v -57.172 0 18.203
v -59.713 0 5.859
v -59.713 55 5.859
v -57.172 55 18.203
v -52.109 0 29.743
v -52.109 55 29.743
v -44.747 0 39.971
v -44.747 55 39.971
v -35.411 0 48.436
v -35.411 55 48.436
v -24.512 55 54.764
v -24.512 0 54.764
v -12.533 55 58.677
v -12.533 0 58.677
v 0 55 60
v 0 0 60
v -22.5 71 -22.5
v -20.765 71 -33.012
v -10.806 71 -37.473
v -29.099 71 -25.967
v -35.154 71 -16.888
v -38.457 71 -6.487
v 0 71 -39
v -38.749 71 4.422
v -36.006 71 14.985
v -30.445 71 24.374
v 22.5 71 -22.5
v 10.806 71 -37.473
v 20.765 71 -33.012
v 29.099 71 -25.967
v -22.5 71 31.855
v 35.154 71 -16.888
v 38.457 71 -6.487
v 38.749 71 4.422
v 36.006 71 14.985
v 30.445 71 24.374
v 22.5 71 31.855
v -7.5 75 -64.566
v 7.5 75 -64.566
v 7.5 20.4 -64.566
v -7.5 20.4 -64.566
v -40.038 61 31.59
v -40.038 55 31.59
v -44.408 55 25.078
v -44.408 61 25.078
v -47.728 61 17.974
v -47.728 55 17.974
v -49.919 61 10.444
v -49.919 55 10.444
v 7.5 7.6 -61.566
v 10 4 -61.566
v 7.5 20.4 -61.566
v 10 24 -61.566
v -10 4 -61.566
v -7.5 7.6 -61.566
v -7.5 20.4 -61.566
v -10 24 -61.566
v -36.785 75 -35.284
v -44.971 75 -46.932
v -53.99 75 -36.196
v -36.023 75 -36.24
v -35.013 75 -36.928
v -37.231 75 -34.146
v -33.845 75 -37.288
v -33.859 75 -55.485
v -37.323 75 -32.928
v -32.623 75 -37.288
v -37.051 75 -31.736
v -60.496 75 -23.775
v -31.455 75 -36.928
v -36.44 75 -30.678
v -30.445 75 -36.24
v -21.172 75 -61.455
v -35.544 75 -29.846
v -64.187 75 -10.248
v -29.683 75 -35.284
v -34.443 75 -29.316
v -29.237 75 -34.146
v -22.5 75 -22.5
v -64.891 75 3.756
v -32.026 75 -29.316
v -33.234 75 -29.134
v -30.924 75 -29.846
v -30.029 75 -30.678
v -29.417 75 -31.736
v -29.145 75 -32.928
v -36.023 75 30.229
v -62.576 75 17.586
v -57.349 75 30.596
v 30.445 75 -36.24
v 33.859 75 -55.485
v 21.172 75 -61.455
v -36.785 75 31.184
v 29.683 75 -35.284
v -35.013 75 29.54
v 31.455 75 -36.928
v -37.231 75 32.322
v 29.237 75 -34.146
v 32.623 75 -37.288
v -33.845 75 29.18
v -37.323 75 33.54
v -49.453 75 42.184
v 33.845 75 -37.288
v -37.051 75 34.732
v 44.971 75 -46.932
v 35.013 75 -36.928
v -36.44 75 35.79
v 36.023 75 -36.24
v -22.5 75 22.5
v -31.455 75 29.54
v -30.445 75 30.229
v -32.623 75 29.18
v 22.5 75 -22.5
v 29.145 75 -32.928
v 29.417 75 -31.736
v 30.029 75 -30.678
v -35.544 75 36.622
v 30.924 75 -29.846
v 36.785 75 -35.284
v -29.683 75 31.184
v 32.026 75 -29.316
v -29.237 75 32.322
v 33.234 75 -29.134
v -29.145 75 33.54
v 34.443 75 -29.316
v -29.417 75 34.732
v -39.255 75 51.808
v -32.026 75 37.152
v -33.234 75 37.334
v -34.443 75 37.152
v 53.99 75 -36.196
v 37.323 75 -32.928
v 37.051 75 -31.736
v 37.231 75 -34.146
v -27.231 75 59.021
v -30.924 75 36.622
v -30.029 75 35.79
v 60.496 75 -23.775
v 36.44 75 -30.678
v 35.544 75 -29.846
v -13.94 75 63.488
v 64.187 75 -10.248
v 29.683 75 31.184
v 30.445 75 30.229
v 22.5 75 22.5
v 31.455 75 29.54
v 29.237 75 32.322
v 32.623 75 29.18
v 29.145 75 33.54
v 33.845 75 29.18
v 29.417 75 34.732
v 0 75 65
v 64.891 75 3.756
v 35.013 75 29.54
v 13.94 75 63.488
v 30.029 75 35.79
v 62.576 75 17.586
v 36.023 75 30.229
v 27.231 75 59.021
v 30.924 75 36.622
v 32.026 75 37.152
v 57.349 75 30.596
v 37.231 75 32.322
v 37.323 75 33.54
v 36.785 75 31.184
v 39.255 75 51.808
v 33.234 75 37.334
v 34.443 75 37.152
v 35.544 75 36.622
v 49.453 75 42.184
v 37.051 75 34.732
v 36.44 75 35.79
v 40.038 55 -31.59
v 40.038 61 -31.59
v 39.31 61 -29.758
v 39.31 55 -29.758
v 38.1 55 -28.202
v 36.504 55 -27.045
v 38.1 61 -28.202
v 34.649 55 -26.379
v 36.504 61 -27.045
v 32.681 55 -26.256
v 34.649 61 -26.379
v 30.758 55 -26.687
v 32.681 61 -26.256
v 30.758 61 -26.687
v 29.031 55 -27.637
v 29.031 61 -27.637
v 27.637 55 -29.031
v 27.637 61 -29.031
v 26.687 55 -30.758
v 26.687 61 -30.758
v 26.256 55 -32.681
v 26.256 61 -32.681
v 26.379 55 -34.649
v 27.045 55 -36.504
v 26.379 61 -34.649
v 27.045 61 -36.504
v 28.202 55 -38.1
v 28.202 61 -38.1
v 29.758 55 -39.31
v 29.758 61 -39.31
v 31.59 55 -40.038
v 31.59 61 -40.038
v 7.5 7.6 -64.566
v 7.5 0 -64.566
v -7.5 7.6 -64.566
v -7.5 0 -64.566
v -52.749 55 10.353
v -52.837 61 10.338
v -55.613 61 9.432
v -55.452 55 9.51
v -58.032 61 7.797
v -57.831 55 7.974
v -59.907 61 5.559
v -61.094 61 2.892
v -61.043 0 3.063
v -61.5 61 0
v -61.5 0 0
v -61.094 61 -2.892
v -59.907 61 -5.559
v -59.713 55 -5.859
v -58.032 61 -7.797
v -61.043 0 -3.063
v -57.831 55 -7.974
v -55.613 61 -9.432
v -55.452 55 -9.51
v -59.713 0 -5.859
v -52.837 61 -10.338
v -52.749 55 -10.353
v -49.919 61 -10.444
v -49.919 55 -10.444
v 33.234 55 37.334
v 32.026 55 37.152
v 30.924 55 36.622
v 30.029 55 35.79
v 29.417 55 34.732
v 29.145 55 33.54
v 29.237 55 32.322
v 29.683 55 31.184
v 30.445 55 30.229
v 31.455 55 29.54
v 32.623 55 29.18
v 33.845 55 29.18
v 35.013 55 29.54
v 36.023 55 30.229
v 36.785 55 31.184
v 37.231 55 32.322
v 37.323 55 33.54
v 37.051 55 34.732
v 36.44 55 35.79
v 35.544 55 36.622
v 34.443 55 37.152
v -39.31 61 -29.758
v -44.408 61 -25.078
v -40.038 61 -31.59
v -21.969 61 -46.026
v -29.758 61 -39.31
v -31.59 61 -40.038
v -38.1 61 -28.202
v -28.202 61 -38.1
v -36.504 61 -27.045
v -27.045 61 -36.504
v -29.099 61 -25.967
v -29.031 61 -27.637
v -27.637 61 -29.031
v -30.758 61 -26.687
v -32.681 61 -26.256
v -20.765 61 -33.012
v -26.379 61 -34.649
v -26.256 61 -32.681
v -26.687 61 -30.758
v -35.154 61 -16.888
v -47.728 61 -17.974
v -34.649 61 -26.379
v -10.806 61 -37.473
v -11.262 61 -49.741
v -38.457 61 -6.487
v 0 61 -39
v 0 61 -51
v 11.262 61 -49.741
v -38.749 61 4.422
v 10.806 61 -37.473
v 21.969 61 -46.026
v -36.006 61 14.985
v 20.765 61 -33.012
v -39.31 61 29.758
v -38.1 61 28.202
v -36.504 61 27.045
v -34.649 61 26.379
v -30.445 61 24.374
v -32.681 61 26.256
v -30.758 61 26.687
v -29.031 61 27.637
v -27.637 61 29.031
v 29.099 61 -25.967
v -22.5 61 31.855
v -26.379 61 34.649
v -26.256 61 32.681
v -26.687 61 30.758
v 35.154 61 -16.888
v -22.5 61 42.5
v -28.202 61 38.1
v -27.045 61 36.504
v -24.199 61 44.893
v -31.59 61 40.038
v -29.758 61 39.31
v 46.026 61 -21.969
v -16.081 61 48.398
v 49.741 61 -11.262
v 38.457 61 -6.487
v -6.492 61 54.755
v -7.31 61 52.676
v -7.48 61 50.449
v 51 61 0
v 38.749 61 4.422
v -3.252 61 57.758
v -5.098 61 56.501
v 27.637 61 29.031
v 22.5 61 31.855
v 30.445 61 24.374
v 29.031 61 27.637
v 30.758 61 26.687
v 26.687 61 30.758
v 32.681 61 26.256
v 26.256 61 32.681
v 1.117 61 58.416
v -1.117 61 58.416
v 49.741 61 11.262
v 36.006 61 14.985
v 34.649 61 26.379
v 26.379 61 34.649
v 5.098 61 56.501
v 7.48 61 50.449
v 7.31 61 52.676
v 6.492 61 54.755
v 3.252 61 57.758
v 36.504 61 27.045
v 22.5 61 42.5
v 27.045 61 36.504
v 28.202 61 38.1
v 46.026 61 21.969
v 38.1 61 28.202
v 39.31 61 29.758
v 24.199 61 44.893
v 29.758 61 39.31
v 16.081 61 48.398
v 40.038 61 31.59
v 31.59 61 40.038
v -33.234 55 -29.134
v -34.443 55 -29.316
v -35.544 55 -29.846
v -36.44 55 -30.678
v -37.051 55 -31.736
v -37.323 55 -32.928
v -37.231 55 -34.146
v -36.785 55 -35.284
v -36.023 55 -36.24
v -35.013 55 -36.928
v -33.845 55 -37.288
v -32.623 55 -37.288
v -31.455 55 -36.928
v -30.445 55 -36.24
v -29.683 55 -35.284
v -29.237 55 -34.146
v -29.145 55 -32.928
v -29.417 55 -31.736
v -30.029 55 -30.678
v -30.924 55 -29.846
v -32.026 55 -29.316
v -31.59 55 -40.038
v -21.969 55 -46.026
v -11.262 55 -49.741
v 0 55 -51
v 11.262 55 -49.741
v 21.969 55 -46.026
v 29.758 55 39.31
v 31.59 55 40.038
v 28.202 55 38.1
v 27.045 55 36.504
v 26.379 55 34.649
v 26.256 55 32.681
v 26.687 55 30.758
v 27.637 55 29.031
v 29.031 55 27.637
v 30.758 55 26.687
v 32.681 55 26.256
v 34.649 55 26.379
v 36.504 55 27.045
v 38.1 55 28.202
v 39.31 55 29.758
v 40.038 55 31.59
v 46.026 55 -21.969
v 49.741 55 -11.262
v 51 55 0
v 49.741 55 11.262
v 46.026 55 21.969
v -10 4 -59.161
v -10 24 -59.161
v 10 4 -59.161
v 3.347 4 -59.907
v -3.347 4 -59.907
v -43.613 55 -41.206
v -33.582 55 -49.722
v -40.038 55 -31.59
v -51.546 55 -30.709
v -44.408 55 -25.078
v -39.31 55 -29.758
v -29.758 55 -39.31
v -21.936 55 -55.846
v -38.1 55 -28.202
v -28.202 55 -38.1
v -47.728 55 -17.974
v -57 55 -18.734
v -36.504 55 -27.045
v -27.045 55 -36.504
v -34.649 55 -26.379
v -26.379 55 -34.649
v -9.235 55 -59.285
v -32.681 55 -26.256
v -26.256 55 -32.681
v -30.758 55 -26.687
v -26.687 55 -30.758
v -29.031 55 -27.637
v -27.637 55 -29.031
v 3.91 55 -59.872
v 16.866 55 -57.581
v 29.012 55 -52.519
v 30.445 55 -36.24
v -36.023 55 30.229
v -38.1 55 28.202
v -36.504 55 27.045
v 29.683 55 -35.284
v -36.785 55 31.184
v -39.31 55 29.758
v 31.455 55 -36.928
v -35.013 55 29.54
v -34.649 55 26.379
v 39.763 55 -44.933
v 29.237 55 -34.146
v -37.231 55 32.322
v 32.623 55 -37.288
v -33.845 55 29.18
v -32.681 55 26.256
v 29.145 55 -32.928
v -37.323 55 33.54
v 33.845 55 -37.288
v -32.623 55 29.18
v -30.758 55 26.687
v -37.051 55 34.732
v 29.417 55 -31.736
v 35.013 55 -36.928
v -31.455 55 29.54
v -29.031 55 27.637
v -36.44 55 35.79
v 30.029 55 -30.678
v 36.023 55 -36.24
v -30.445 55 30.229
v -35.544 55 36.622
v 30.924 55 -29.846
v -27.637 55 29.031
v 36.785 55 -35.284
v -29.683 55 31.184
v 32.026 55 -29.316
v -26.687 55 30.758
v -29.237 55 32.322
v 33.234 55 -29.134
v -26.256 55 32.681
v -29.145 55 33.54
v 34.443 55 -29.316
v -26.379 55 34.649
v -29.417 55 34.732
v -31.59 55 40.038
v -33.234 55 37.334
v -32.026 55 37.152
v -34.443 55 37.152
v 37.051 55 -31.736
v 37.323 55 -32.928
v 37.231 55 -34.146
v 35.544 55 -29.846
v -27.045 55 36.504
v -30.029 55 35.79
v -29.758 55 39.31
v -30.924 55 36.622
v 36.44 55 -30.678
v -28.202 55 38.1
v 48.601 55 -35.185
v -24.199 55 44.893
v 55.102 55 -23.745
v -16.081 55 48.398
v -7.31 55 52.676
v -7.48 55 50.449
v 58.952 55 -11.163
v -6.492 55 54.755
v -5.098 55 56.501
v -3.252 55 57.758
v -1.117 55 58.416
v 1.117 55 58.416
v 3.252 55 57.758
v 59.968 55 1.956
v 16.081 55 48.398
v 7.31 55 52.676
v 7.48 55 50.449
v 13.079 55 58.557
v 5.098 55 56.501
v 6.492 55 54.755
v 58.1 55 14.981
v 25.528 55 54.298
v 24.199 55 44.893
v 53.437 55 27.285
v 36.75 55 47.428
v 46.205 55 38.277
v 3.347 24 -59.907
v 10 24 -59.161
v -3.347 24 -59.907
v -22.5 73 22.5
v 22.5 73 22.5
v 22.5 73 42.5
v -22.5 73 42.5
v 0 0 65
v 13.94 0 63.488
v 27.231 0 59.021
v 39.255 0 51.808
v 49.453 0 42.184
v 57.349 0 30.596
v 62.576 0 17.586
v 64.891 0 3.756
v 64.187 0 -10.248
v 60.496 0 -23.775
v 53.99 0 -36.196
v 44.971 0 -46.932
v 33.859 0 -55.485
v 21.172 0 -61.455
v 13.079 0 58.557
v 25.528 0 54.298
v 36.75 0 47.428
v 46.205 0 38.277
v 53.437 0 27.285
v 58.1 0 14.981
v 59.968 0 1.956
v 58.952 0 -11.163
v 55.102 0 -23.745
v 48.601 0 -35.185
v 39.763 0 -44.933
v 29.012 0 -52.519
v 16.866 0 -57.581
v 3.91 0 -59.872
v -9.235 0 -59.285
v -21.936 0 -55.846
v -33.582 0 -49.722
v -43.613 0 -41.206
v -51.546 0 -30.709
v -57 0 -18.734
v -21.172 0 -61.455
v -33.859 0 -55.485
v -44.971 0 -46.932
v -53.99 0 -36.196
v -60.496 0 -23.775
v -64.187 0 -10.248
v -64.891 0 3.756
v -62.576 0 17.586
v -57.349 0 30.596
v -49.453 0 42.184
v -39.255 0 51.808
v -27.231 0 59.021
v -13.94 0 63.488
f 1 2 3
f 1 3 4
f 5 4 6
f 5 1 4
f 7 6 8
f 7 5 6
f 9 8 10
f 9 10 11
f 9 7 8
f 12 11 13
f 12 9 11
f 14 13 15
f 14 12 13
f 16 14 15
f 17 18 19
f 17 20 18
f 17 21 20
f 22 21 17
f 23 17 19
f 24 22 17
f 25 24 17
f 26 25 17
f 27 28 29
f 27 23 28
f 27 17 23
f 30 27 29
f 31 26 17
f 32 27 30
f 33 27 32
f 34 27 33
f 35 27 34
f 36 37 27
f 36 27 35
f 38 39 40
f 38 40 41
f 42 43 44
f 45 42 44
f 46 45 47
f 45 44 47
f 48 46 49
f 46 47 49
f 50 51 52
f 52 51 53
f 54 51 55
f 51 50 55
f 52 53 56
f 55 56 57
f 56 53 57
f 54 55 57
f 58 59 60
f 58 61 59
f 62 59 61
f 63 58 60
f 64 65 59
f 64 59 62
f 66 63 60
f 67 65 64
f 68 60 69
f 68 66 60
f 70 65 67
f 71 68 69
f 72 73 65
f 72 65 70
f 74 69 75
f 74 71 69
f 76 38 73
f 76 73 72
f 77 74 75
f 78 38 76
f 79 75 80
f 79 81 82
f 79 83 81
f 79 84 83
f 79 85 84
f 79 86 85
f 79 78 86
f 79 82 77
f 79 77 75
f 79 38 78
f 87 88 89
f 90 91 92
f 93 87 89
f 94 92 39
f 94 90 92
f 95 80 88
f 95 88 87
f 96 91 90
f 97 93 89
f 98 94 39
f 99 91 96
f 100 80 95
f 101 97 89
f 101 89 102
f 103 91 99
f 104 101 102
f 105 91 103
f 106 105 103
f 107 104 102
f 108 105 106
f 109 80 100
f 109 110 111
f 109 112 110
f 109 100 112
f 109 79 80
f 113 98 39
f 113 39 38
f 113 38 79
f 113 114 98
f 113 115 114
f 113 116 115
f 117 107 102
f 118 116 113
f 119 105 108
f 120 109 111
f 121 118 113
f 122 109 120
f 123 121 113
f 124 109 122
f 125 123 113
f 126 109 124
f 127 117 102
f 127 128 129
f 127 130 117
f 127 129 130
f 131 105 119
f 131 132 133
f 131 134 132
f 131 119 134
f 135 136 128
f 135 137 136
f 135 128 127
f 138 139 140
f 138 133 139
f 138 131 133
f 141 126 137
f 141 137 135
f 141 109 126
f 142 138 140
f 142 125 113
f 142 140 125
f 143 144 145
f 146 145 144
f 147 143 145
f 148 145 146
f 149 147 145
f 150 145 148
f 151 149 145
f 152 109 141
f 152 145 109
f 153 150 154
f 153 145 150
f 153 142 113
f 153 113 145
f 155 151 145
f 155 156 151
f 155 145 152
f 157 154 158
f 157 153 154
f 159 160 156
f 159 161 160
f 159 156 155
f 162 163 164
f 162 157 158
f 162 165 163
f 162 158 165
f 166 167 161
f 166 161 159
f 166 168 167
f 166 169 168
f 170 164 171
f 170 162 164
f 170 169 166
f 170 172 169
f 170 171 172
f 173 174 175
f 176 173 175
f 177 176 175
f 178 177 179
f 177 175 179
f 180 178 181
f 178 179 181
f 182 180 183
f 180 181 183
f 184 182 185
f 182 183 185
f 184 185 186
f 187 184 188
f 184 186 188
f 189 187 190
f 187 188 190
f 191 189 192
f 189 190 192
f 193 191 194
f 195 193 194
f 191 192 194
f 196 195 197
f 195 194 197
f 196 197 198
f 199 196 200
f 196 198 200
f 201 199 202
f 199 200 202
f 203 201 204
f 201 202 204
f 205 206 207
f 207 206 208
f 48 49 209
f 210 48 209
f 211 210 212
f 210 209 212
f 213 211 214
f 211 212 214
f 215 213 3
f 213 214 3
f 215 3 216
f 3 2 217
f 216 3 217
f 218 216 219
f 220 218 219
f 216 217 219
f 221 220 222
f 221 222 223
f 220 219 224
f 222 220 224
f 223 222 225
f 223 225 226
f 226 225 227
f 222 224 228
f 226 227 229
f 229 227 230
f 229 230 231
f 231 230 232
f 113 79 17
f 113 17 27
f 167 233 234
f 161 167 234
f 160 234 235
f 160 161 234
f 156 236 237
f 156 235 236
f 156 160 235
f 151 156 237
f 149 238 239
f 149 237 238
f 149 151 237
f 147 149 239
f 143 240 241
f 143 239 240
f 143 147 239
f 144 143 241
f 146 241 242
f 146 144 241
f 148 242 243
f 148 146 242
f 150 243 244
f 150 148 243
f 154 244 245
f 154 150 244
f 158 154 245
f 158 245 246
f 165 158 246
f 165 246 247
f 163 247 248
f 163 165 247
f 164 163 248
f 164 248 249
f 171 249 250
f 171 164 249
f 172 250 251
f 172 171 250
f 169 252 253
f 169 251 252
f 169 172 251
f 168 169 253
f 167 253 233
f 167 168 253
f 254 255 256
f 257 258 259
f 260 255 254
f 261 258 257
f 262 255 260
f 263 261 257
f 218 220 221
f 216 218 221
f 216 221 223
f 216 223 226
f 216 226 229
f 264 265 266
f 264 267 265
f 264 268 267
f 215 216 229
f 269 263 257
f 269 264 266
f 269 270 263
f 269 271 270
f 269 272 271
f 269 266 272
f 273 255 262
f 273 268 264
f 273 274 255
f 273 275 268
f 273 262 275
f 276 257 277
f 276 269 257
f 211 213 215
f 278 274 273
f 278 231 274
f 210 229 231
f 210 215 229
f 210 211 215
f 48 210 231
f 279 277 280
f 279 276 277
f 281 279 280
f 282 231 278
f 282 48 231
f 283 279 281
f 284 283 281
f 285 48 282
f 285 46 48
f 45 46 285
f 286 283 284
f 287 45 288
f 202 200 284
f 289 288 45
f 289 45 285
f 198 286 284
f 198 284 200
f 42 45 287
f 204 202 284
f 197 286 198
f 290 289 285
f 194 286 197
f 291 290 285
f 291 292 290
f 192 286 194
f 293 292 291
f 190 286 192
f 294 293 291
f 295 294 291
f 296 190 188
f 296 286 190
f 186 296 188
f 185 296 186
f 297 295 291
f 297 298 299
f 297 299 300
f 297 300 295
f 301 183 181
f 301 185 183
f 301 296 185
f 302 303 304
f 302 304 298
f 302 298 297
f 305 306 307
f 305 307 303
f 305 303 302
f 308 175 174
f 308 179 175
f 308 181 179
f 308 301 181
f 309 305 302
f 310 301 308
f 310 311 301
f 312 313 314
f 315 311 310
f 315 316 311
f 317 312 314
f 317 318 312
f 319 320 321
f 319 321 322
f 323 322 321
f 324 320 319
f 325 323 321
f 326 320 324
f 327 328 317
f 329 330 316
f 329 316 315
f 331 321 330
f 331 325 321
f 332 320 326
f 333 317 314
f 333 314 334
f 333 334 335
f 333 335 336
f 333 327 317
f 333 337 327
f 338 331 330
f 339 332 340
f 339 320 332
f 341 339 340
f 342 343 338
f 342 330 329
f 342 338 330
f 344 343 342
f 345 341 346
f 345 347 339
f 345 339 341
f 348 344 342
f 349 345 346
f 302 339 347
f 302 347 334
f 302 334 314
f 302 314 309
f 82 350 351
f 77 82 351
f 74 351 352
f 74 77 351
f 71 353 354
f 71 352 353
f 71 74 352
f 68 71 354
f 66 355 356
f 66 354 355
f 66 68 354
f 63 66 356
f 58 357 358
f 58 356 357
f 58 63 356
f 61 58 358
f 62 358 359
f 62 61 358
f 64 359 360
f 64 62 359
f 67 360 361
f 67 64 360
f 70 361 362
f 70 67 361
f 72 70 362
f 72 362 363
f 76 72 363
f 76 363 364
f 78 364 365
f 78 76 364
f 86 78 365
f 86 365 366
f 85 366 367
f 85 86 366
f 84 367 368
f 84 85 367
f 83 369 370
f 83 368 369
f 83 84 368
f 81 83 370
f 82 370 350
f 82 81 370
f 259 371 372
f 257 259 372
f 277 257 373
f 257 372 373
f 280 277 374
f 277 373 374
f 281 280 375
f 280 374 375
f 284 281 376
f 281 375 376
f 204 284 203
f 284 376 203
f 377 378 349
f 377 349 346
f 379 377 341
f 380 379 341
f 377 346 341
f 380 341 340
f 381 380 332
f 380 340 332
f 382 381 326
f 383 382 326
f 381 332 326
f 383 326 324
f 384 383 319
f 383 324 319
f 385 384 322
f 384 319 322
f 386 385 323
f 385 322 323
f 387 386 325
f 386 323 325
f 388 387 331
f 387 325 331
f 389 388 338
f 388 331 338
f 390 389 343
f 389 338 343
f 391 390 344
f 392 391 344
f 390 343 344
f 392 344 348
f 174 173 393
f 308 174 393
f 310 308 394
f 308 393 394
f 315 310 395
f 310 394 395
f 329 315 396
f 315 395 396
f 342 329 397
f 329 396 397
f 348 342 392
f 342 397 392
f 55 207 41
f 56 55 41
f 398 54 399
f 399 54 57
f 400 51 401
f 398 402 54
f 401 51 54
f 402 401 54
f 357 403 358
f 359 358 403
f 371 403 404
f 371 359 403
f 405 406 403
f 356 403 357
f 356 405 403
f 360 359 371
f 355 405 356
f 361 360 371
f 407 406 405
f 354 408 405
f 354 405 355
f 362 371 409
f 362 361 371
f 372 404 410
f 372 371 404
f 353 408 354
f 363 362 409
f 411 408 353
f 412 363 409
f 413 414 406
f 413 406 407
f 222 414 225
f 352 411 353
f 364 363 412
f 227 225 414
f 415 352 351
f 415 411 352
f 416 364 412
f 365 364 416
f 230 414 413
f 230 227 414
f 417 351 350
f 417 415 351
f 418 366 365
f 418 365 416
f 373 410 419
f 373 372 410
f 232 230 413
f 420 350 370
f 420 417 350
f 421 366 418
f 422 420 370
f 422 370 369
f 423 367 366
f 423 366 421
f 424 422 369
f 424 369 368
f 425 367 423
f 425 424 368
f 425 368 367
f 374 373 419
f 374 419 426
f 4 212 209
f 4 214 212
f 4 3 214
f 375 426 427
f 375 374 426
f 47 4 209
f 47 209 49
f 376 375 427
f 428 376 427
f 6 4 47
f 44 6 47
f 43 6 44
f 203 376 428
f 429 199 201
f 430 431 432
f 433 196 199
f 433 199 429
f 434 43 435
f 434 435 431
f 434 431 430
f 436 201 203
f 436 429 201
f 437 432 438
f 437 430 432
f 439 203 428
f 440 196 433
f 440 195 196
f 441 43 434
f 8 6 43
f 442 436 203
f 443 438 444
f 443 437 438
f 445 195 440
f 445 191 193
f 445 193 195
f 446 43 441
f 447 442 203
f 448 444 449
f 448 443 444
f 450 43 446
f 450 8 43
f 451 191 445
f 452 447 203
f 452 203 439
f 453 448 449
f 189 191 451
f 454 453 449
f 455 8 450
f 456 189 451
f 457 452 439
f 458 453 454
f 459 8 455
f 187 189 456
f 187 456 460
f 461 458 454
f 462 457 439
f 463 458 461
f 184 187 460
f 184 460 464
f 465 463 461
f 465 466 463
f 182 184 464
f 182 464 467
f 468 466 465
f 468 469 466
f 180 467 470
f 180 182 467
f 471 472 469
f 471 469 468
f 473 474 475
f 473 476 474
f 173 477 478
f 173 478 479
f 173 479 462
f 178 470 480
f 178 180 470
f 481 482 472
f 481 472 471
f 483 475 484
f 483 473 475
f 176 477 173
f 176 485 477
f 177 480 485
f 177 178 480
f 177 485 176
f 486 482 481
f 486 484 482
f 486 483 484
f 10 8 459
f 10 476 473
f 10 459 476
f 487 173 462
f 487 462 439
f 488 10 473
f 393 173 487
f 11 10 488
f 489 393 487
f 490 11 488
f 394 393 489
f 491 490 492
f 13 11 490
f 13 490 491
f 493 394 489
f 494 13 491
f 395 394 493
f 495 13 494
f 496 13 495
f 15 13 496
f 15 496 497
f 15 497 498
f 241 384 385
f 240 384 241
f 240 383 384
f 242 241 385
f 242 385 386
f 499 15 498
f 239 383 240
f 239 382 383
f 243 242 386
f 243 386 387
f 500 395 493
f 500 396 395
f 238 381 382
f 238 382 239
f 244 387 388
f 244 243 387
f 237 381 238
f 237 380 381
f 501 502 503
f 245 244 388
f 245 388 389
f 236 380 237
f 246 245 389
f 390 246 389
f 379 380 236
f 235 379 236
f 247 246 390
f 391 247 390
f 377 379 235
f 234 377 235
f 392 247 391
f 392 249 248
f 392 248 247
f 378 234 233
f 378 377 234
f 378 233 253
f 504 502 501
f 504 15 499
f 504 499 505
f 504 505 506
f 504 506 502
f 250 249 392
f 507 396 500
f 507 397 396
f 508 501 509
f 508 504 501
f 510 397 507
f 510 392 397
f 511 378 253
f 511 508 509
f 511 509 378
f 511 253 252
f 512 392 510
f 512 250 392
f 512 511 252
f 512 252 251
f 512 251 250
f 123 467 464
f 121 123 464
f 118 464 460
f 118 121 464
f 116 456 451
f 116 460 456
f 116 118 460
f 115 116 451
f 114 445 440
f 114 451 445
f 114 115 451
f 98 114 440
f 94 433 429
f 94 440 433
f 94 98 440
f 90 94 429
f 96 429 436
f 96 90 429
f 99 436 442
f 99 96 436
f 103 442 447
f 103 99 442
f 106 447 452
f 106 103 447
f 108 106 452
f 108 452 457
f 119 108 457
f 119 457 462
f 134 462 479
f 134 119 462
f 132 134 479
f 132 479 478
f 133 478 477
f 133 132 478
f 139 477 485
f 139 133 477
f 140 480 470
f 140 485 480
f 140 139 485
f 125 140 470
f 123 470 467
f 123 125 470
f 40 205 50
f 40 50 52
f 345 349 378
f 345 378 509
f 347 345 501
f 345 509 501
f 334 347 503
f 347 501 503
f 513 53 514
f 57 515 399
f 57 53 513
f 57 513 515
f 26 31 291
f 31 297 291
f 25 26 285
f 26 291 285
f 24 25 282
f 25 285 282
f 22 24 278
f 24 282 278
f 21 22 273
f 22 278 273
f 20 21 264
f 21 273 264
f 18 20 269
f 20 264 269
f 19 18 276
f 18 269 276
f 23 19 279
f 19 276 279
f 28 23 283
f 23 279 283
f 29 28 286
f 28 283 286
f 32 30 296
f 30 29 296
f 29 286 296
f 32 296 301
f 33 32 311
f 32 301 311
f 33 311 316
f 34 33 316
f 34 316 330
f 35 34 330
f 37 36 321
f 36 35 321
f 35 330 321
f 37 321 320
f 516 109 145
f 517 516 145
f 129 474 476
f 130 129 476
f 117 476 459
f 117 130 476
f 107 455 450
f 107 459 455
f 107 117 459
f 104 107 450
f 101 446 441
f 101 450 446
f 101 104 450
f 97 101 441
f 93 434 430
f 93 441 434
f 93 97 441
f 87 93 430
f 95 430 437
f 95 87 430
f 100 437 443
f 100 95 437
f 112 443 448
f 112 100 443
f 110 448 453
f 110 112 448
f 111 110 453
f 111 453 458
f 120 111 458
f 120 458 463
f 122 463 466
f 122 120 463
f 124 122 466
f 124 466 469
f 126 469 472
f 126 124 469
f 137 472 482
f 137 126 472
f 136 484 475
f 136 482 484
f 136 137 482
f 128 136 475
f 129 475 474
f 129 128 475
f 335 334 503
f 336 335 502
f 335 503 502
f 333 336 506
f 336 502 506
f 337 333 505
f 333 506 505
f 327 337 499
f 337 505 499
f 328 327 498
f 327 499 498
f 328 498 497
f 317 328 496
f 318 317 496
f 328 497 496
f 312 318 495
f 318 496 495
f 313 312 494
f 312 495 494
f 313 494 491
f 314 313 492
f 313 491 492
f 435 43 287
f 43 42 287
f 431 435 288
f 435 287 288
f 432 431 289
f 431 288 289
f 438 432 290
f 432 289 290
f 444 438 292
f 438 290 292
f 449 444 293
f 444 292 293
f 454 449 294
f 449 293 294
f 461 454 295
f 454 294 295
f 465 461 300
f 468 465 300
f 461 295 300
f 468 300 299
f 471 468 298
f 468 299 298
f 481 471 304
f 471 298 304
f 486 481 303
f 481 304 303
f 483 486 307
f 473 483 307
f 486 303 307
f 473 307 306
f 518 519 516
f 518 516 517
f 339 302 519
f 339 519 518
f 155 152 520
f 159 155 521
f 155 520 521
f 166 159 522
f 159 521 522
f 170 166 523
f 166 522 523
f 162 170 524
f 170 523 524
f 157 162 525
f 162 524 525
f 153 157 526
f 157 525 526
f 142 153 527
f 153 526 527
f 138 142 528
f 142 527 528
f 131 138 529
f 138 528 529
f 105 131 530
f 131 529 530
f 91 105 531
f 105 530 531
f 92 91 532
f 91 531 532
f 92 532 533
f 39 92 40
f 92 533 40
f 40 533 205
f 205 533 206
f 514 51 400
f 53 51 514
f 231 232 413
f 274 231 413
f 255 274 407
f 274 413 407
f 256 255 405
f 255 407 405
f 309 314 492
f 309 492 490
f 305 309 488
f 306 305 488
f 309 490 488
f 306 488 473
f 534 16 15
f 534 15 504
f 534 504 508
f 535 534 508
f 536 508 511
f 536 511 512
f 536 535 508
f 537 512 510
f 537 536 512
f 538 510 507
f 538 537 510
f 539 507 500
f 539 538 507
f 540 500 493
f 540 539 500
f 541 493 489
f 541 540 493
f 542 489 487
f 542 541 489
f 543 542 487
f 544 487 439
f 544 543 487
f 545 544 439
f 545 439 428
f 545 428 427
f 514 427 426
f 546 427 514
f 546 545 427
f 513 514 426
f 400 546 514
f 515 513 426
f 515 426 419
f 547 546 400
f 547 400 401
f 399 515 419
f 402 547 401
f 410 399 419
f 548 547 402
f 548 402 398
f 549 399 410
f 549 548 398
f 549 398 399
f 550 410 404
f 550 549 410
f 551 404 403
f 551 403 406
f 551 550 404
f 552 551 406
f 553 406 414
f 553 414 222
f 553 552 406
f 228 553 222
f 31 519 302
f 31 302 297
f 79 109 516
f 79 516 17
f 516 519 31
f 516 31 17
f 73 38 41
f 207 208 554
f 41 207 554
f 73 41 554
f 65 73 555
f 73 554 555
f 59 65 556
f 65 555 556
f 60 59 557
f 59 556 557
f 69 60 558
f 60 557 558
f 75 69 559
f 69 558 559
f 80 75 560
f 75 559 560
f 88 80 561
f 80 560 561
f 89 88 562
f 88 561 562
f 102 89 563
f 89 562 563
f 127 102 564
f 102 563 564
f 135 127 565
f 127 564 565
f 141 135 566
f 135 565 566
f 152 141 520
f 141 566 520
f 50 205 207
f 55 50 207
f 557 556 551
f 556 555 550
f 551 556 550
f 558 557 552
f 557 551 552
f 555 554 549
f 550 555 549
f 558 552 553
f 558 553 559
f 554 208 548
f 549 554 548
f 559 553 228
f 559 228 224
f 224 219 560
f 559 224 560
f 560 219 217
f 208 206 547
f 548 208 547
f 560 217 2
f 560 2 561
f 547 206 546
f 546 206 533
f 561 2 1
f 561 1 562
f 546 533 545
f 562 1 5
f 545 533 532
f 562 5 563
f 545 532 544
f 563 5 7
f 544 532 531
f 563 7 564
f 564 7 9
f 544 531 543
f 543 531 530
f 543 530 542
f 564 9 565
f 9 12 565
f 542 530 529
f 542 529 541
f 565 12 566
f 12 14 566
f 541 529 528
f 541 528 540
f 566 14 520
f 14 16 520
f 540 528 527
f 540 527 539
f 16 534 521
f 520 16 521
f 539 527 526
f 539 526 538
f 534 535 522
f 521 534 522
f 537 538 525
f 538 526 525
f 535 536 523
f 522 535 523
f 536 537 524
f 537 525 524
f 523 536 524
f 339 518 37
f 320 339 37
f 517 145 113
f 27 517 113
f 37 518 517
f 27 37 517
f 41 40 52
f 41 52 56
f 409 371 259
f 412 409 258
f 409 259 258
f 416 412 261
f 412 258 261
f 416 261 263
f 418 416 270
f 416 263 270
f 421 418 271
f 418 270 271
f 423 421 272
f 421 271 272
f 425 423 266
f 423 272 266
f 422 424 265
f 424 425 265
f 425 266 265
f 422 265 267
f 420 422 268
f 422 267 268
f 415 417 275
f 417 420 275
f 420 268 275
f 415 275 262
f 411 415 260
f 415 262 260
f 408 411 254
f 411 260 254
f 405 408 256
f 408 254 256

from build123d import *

# Parameters (mm, degrees)
SKETCH1_R               = 65
SKETCH1_R_2             = 60
BOSS_EXTRUDE1_DEPTH     = 55
SKETCH2_R               = 65
BOSS_EXTRUDE2_DEPTH     = 20
SKETCH3_R               = 4.1
SKETCH3_W               = 45
SKETCH3_H               = 45
CUT_EXTRUDE1_DEPTH      = 76
SKETCH5_W               = 45
SKETCH5_H               = 20
CUT_EXTRUDE2_DEPTH      = 18
SKETCH6_R               = 51
CUT_EXTRUDE3_DEPTH      = 6
SKETCH7_R               = 7
SKETCH7_R_2             = 4.1
BOSS_EXTRUDE3_DEPTH     = 6
SKETCH8_R               = 39
CUT_EXTRUDE4_DEPTH      = 10
CUT_EXTRUDE5_DEPTH      = 1
CUT_EXTRUDE5_DEPTH_BACK = 76
SKETCH10_W              = 15
SKETCH10_H              = 12.8
CUT_EXTRUDE6_DEPTH      = 10
CUT_EXTRUDE7_START      = -3
SKETCH11_W              = 20
SKETCH11_H              = 20
CUT_EXTRUDE7_DEPTH      = 10
SKETCH12_R              = 7.5
CUT_EXTRUDE8_DEPTH      = 6
SKETCH13_R              = 10.5
CUT_EXTRUDE9_DEPTH      = 56
CUT_EXTRUDE9_DEPTH_BACK = 6


with BuildPart() as part:
    # Sketch1 → Boss-Extrude1 (new body)
    with BuildSketch(Plane(origin=(0, 0, 0), x_dir=(1, 0, 0), z_dir=(0, 1, 0))):
        with Locations(Location((0, 0, 0), (0, 0, 270))):  # turned: the seam where the file's is
            Circle(SKETCH1_R)
        with Locations(Location((0, 0, 0), (0, 0, 270))):  # turned: the seam where the file's is
            Circle(SKETCH1_R_2, mode=Mode.SUBTRACT)
    extrude(amount=BOSS_EXTRUDE1_DEPTH)

    # Sketch2 → Boss-Extrude2 (add)
    with BuildSketch(Plane(origin=(0, 55, 0), x_dir=(1, 0, 0), z_dir=(0, 1, 0))):
        with Locations(Location((0, 0, 0), (0, 0, 270))):  # turned: the seam where the file's is
            Circle(SKETCH2_R)
    extrude(amount=BOSS_EXTRUDE2_DEPTH)

    # Sketch3 → Cut-Extrude1 (cut, through all)
    with BuildSketch(Plane(origin=(0, 75, 0), x_dir=(1, 0, 0), z_dir=(0, 1, 0))):
        with Locations(Location((-33.234018716, -33.234018716, 0), (0, 0, 270))):  # turned: the seam where the file's is
            Circle(SKETCH3_R)
        with Locations(Location((-33.234018716, 33.234018716, 0), (0, 0, 270))):  # turned: the seam where the file's is
            Circle(SKETCH3_R)
        with Locations(Location((33.234018716, 33.234018716, 0), (0, 0, 270))):  # turned: the seam where the file's is
            Circle(SKETCH3_R)
        with Locations(Location((33.234018716, -33.234018716, 0), (0, 0, 270))):  # turned: the seam where the file's is
            Circle(SKETCH3_R)
        Rectangle(SKETCH3_W, SKETCH3_H)
    extrude(amount=-CUT_EXTRUDE1_DEPTH, mode=Mode.SUBTRACT)

    # Sketch5 → Cut-Extrude2 (cut)
    with BuildSketch(Plane.XZ.offset(-55)):
        with Locations((0, 32.5)):
            Rectangle(SKETCH5_W, SKETCH5_H)
    extrude(amount=-CUT_EXTRUDE2_DEPTH, mode=Mode.SUBTRACT)

    # Sketch6 → Cut-Extrude3 (cut)
    with BuildSketch(Plane.XZ.offset(-55)):
        Circle(SKETCH6_R)
    extrude(amount=-CUT_EXTRUDE3_DEPTH, mode=Mode.SUBTRACT)

    # Sketch7 → Boss-Extrude3 (add)
    with BuildSketch(Plane.XZ.offset(-61)):
        with Locations((-33.234018716, -33.234018716)):
            Circle(SKETCH7_R)
        with Locations(Location((-33.234018716, -33.234018716, 0), (0, 0, 90))):  # turned: the seam where the file's is
            Circle(SKETCH7_R_2, mode=Mode.SUBTRACT)
        with Locations((-33.234018716, 33.234018716)):
            Circle(SKETCH7_R)
        with Locations(Location((-33.234018716, 33.234018716, 0), (0, 0, 90))):  # turned: the seam where the file's is
            Circle(SKETCH7_R_2, mode=Mode.SUBTRACT)
        with Locations((33.234018716, -33.234018716)):
            Circle(SKETCH7_R)
        with Locations(Location((33.234018716, -33.234018716, 0), (0, 0, 90))):  # turned: the seam where the file's is
            Circle(SKETCH7_R_2, mode=Mode.SUBTRACT)
        with Locations((33.234018716, 33.234018716)):
            Circle(SKETCH7_R)
        with Locations(Location((33.234018716, 33.234018716, 0), (0, 0, 90))):  # turned: the seam where the file's is
            Circle(SKETCH7_R_2, mode=Mode.SUBTRACT)
    extrude(amount=BOSS_EXTRUDE3_DEPTH)

    # Sketch8 → Cut-Extrude4 (cut)
    with BuildSketch(Plane.XZ.offset(-61)):
        Circle(SKETCH8_R)
    extrude(amount=-CUT_EXTRUDE4_DEPTH, mode=Mode.SUBTRACT)

    # Sketch9 → Cut-Extrude5 (cut, two sides)
    with BuildSketch(Plane.XZ) as cut_extrude5_sk:
        Polygon((314.441485957, -64.565857851), (7.5, -64.565857851), (-7.5, -64.565857851), (-314.441485957, -64.565857851), (-314.441485957, -678.448829765), (314.441485957, -678.448829765), align=None)
    extrude(amount=CUT_EXTRUDE5_DEPTH, mode=Mode.SUBTRACT)
    extrude(cut_extrude5_sk.sketch, amount=-CUT_EXTRUDE5_DEPTH_BACK, mode=Mode.SUBTRACT)

    # Sketch10 → Cut-Extrude6 (cut)
    with BuildSketch(Plane(origin=(0, 0, -64.565857851), x_dir=(-1, 0, 0), z_dir=(0, 0, -1))):
        with Locations((0, 14)):
            Rectangle(SKETCH10_W, SKETCH10_H)
    extrude(amount=-CUT_EXTRUDE6_DEPTH, mode=Mode.SUBTRACT)

    # Sketch11 → Cut-Extrude7 (cut)
    with BuildSketch(Plane(origin=(0, 0, -64.565857851), x_dir=(-1, 0, 0), z_dir=(0, 0, -1)).offset(CUT_EXTRUDE7_START)):
        with Locations((0, 14)):
            Rectangle(SKETCH11_W, SKETCH11_H)
    extrude(amount=-CUT_EXTRUDE7_DEPTH, mode=Mode.SUBTRACT)

    # Sketch12 → Cut-Extrude8 (cut)
    with BuildSketch(Plane.XZ.offset(-55)):
        with Locations((0, 51)):
            Circle(SKETCH12_R)
    extrude(amount=-CUT_EXTRUDE8_DEPTH, mode=Mode.SUBTRACT)

    # Sketch13 → Cut-Extrude9 (cut, two sides)
    with BuildSketch(Plane.XZ.offset(-55)) as cut_extrude9_sk:
        with Locations((-51, 0)):
            Circle(SKETCH13_R)
    extrude(amount=CUT_EXTRUDE9_DEPTH, mode=Mode.SUBTRACT)
    extrude(cut_extrude9_sk.sketch, amount=-CUT_EXTRUDE9_DEPTH_BACK, mode=Mode.SUBTRACT)


solid = part.part
